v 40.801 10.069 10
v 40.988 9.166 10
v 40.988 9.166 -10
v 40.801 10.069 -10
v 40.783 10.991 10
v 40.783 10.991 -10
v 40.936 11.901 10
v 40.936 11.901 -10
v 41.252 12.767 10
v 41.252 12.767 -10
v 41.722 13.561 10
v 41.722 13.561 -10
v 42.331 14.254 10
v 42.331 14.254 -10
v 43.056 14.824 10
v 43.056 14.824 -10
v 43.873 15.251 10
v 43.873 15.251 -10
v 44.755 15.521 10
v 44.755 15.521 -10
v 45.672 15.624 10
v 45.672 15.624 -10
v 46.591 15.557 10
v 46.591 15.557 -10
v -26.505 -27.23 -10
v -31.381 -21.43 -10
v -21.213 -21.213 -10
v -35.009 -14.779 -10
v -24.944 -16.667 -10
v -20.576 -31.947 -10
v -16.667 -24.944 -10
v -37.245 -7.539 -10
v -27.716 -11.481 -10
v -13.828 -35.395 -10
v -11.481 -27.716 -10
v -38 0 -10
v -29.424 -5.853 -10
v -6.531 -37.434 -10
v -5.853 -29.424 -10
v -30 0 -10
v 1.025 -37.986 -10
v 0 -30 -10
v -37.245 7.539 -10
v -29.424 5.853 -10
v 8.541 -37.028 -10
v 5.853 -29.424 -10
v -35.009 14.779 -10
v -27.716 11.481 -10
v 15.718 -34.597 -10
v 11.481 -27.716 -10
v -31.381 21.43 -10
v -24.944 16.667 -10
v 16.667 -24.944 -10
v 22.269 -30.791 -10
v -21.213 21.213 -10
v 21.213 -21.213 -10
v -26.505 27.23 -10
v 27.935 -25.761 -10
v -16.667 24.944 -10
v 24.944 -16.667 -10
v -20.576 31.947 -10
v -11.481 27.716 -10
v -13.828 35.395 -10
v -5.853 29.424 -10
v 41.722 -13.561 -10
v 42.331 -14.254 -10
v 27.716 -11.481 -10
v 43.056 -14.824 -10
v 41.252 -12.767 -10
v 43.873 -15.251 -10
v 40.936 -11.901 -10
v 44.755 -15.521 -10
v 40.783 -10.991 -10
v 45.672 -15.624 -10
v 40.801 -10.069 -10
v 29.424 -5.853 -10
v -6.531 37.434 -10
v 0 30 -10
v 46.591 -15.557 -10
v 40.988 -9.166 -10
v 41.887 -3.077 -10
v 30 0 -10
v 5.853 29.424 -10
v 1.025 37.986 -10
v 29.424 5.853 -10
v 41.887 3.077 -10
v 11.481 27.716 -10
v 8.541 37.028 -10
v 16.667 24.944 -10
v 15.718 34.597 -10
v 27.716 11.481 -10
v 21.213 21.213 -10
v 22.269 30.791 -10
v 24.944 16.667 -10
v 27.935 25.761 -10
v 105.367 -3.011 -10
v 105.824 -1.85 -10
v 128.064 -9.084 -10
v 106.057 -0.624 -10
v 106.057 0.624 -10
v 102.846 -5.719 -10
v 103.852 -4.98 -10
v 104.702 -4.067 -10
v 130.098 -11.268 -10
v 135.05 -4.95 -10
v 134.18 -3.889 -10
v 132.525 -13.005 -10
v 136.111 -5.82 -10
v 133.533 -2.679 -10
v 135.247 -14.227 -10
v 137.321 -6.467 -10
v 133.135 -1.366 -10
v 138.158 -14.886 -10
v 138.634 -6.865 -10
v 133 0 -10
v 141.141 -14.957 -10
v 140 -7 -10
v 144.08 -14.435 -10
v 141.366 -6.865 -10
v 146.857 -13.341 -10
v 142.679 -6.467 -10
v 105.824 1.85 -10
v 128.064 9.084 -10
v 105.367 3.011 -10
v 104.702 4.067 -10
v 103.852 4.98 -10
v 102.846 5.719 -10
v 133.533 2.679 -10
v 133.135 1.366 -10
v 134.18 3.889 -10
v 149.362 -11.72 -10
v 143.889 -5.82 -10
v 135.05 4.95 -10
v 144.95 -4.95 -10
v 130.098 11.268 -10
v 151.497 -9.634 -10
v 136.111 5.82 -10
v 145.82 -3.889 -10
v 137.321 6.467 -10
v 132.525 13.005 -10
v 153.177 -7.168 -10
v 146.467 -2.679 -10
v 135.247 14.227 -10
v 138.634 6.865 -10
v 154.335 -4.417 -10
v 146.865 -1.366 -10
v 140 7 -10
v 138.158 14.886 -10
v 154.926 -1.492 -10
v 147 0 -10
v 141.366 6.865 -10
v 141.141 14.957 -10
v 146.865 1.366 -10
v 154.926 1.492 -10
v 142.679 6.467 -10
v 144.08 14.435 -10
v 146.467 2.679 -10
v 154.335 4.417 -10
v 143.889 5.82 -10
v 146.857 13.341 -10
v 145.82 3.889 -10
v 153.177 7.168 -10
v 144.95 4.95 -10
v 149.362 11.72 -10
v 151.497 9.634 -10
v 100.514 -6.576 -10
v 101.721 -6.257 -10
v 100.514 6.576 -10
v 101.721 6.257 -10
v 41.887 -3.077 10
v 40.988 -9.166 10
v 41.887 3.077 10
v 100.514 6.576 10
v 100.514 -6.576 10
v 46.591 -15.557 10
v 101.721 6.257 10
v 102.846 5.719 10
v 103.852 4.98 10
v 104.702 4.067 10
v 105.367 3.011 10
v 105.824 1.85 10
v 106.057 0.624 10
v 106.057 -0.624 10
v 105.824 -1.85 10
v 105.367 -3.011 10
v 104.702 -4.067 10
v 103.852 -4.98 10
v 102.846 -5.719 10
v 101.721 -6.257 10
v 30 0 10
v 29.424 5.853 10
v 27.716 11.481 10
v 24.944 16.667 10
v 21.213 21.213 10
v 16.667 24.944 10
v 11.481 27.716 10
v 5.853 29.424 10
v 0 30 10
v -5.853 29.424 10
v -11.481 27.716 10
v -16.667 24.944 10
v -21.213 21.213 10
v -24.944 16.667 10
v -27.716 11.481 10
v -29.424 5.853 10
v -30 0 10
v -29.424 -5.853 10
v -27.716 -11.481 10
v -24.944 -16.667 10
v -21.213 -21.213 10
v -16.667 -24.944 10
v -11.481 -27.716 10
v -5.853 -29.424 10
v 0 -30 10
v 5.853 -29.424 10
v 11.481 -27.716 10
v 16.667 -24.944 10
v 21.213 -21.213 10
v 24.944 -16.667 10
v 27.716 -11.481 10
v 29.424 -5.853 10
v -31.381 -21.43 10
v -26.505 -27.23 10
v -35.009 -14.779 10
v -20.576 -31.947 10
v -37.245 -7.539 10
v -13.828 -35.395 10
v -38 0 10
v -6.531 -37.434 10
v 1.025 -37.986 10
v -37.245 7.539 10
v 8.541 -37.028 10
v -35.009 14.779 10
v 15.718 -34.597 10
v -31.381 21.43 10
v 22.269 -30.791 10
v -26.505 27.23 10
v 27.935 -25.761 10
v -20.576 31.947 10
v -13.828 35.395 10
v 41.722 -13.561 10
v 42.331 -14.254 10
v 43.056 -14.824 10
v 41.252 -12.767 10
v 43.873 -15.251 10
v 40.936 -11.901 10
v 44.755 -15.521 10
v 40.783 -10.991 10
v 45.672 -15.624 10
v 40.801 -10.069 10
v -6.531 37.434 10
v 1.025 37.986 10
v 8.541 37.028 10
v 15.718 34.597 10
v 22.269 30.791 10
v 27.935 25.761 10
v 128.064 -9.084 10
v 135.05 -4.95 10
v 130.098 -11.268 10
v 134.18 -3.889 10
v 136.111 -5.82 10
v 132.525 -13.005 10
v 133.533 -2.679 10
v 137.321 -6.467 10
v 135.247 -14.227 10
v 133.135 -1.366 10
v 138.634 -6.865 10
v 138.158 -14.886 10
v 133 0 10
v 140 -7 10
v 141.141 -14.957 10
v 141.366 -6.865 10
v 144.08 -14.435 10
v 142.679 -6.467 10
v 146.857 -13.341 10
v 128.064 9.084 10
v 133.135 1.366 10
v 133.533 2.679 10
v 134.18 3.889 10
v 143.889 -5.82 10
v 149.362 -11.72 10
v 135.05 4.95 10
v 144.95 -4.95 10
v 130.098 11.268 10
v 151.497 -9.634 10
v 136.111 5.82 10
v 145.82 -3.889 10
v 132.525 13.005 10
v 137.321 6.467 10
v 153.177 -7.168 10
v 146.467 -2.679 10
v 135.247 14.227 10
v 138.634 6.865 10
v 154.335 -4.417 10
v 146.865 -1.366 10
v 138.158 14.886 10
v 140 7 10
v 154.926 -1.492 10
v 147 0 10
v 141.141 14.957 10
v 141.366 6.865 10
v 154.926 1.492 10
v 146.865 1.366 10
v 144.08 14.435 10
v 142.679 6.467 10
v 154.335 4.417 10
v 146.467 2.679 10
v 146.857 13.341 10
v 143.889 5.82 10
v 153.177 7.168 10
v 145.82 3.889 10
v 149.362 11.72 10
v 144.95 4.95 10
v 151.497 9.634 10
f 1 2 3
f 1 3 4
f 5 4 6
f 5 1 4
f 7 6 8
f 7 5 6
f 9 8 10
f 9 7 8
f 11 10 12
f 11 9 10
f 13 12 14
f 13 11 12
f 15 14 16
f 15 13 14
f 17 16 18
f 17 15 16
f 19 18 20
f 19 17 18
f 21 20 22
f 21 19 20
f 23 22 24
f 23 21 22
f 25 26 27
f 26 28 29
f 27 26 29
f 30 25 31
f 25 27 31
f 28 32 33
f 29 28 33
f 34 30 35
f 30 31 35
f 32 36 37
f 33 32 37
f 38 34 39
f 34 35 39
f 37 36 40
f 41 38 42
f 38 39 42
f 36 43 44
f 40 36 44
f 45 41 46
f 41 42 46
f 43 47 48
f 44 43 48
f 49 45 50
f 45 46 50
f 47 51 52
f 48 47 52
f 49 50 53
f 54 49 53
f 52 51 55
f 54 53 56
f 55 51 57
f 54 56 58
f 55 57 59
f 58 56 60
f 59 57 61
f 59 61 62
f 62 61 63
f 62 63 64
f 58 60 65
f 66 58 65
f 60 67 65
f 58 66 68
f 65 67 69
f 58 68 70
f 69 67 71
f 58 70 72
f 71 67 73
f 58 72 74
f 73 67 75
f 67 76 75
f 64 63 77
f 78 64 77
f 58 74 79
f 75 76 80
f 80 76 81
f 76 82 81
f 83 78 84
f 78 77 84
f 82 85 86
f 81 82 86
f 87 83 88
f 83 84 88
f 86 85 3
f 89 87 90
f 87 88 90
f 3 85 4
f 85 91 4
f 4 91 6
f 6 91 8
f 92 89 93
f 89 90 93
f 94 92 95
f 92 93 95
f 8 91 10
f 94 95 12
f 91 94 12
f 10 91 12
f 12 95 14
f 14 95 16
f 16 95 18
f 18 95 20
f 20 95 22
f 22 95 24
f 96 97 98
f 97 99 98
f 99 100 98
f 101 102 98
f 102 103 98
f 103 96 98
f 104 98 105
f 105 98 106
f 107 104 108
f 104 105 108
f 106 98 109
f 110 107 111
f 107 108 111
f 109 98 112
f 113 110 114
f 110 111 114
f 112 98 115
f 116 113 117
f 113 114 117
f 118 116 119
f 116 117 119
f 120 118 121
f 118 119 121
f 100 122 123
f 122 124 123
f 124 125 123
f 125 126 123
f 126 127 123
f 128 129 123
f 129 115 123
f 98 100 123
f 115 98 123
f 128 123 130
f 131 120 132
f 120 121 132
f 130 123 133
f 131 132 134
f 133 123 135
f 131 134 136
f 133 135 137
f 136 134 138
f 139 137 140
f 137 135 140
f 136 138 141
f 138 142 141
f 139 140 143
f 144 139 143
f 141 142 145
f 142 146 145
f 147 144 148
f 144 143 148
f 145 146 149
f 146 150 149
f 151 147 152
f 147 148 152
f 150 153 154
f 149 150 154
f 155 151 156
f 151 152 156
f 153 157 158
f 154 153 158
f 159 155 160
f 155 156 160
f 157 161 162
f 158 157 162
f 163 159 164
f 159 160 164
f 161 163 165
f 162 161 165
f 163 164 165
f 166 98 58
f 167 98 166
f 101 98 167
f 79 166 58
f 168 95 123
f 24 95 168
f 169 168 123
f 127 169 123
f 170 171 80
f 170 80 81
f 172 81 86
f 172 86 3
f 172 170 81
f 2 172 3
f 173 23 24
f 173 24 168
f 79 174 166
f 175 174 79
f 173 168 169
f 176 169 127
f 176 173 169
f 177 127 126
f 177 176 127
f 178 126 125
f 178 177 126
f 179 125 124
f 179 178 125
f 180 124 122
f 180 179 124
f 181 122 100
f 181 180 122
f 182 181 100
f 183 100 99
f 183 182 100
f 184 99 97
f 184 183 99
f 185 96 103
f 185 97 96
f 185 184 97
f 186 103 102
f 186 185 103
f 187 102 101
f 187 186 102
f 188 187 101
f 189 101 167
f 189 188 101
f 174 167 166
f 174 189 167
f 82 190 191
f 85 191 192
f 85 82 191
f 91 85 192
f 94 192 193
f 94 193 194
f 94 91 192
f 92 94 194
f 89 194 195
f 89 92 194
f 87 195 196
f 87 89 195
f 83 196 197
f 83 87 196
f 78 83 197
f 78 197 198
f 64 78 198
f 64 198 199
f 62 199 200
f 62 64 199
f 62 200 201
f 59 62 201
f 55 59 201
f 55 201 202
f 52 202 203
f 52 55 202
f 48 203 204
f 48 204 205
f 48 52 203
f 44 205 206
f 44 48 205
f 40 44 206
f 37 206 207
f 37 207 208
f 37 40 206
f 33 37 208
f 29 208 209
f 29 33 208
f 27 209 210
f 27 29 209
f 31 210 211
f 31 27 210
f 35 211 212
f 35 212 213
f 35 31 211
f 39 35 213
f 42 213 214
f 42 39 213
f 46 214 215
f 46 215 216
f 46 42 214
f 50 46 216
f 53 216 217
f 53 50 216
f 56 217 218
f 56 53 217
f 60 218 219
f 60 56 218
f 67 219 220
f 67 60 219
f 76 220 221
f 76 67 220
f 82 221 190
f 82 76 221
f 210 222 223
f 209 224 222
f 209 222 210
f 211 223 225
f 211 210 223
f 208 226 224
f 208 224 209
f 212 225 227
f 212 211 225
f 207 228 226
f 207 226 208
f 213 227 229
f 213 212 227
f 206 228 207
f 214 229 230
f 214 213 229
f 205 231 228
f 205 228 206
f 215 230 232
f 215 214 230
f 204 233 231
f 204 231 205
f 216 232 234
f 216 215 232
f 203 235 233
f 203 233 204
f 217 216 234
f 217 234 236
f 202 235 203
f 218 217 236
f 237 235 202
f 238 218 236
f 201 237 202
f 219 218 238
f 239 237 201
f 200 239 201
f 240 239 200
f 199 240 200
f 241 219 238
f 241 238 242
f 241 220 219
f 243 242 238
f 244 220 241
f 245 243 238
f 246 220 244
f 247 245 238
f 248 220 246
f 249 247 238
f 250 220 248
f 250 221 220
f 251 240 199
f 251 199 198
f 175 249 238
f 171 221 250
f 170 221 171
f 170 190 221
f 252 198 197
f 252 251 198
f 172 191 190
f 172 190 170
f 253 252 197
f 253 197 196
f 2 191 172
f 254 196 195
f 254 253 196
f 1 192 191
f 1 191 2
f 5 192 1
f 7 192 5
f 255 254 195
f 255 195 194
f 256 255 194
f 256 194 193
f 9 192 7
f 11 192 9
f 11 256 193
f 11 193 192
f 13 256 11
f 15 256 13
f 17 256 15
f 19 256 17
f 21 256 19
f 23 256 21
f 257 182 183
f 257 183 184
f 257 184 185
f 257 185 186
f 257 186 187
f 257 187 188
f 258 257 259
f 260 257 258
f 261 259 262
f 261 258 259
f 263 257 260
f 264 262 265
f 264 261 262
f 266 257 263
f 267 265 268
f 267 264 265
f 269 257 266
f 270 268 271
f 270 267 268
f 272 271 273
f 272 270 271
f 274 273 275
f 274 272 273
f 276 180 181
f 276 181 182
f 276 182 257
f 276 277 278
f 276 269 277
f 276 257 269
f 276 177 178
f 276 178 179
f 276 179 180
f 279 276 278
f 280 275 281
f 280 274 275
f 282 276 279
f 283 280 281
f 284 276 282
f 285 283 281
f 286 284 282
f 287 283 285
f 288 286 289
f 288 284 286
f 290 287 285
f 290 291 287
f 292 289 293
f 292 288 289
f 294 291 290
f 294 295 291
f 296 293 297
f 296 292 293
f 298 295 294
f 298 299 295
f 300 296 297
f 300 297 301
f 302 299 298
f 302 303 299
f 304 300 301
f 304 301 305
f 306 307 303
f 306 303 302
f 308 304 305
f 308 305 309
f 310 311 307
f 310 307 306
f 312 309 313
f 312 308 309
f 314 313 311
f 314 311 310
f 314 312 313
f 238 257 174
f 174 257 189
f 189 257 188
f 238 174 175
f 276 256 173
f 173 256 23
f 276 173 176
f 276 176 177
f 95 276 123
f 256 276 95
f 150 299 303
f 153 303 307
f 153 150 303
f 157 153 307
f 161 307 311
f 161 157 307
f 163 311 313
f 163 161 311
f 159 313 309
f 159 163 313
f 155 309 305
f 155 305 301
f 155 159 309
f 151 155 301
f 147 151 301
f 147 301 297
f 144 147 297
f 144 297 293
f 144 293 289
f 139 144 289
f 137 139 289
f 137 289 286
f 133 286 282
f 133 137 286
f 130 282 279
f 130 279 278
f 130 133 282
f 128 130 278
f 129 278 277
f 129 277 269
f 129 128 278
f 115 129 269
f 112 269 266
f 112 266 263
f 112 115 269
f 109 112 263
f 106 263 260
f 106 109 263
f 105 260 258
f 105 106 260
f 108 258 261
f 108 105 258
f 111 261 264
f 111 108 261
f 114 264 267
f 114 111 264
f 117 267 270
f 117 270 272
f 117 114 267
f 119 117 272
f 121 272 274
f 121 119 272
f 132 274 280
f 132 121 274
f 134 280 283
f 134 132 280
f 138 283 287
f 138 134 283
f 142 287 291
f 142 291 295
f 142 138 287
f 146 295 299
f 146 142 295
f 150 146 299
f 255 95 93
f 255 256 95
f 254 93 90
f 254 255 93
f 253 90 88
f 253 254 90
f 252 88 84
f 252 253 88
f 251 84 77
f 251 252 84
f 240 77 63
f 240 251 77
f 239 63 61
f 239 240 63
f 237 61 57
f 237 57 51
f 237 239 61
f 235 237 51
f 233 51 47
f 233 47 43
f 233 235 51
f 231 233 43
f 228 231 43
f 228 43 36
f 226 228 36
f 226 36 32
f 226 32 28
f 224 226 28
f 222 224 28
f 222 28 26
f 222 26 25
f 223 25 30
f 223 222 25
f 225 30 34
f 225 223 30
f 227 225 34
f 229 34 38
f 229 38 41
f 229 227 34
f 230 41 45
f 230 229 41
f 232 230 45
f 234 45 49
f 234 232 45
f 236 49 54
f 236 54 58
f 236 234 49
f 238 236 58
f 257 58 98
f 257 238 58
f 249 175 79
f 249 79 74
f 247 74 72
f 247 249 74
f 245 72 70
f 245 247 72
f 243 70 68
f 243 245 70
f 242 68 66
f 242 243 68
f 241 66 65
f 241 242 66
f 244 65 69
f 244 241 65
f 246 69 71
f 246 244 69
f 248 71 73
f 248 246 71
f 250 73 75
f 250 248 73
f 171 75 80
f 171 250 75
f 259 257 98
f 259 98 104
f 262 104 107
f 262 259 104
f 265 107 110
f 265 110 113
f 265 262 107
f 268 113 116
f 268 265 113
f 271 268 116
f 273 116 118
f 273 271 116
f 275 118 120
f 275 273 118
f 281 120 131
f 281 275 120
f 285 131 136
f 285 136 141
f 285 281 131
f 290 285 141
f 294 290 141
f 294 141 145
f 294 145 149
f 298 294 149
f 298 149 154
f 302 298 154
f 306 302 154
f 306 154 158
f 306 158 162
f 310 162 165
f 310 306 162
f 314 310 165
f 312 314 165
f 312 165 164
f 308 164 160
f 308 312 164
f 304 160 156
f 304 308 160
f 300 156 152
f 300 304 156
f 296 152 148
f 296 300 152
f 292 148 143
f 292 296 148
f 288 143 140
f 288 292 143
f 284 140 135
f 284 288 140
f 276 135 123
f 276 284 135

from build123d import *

# Parameters (mm, degrees)
SKETCH1_R           = 30
SKETCH1_R_2         = 7
BOSS_EXTRUDE1_DEPTH = 10
CUT_EXTRUDE1_DEPTH  = 161.838428244


with BuildPart() as part:
    # Sketch1 → Boss-Extrude1 (new, symmetric)
    with BuildSketch(Plane.XY):
        with BuildLine():
            Line((27.935473676, -25.760615491), (128.063755469, -9.084385863))
            ThreePointArc((128.063755469, -9.084385863), (155, 0), (128.063755469, 9.084385863))
            Line((128.063755469, 9.084385863), (27.935473676, 25.760615491))
            ThreePointArc((27.935473676, 25.760615491), (-38, 0), (27.935473676, -25.760615491))
        make_face()
        Circle(SKETCH1_R, mode=Mode.SUBTRACT)
        with Locations((140, 0)):
            Circle(SKETCH1_R_2, mode=Mode.SUBTRACT)
    extrude(amount=BOSS_EXTRUDE1_DEPTH, both=True)

    # Sketch2 → Cut-Extrude1 (cut, through all)
    with BuildSketch(Plane.XY.offset(10)):
        with BuildLine():
            Line((46.591424383, 15.557071672), (100.514303988, 6.576289156))
            ThreePointArc((100.514303988, 6.576289156), (106.085905266, 0), (100.514303988, -6.576289156))
            Line((100.514303988, -6.576289156), (46.591424383, -15.557071672))
            ThreePointArc((46.591424383, -15.557071672), (42.010455779, -13.921347897), (40.987646035, -9.165853617))
            ThreePointArc((40.987646035, -9.165853617), (42, 0), (40.987646035, 9.165853617))
            ThreePointArc((40.987646035, 9.165853617), (42.010455779, 13.921347897), (46.591424383, 15.557071672))
        make_face()
    extrude(amount=-CUT_EXTRUDE1_DEPTH, mode=Mode.SUBTRACT)


solid = part.part
